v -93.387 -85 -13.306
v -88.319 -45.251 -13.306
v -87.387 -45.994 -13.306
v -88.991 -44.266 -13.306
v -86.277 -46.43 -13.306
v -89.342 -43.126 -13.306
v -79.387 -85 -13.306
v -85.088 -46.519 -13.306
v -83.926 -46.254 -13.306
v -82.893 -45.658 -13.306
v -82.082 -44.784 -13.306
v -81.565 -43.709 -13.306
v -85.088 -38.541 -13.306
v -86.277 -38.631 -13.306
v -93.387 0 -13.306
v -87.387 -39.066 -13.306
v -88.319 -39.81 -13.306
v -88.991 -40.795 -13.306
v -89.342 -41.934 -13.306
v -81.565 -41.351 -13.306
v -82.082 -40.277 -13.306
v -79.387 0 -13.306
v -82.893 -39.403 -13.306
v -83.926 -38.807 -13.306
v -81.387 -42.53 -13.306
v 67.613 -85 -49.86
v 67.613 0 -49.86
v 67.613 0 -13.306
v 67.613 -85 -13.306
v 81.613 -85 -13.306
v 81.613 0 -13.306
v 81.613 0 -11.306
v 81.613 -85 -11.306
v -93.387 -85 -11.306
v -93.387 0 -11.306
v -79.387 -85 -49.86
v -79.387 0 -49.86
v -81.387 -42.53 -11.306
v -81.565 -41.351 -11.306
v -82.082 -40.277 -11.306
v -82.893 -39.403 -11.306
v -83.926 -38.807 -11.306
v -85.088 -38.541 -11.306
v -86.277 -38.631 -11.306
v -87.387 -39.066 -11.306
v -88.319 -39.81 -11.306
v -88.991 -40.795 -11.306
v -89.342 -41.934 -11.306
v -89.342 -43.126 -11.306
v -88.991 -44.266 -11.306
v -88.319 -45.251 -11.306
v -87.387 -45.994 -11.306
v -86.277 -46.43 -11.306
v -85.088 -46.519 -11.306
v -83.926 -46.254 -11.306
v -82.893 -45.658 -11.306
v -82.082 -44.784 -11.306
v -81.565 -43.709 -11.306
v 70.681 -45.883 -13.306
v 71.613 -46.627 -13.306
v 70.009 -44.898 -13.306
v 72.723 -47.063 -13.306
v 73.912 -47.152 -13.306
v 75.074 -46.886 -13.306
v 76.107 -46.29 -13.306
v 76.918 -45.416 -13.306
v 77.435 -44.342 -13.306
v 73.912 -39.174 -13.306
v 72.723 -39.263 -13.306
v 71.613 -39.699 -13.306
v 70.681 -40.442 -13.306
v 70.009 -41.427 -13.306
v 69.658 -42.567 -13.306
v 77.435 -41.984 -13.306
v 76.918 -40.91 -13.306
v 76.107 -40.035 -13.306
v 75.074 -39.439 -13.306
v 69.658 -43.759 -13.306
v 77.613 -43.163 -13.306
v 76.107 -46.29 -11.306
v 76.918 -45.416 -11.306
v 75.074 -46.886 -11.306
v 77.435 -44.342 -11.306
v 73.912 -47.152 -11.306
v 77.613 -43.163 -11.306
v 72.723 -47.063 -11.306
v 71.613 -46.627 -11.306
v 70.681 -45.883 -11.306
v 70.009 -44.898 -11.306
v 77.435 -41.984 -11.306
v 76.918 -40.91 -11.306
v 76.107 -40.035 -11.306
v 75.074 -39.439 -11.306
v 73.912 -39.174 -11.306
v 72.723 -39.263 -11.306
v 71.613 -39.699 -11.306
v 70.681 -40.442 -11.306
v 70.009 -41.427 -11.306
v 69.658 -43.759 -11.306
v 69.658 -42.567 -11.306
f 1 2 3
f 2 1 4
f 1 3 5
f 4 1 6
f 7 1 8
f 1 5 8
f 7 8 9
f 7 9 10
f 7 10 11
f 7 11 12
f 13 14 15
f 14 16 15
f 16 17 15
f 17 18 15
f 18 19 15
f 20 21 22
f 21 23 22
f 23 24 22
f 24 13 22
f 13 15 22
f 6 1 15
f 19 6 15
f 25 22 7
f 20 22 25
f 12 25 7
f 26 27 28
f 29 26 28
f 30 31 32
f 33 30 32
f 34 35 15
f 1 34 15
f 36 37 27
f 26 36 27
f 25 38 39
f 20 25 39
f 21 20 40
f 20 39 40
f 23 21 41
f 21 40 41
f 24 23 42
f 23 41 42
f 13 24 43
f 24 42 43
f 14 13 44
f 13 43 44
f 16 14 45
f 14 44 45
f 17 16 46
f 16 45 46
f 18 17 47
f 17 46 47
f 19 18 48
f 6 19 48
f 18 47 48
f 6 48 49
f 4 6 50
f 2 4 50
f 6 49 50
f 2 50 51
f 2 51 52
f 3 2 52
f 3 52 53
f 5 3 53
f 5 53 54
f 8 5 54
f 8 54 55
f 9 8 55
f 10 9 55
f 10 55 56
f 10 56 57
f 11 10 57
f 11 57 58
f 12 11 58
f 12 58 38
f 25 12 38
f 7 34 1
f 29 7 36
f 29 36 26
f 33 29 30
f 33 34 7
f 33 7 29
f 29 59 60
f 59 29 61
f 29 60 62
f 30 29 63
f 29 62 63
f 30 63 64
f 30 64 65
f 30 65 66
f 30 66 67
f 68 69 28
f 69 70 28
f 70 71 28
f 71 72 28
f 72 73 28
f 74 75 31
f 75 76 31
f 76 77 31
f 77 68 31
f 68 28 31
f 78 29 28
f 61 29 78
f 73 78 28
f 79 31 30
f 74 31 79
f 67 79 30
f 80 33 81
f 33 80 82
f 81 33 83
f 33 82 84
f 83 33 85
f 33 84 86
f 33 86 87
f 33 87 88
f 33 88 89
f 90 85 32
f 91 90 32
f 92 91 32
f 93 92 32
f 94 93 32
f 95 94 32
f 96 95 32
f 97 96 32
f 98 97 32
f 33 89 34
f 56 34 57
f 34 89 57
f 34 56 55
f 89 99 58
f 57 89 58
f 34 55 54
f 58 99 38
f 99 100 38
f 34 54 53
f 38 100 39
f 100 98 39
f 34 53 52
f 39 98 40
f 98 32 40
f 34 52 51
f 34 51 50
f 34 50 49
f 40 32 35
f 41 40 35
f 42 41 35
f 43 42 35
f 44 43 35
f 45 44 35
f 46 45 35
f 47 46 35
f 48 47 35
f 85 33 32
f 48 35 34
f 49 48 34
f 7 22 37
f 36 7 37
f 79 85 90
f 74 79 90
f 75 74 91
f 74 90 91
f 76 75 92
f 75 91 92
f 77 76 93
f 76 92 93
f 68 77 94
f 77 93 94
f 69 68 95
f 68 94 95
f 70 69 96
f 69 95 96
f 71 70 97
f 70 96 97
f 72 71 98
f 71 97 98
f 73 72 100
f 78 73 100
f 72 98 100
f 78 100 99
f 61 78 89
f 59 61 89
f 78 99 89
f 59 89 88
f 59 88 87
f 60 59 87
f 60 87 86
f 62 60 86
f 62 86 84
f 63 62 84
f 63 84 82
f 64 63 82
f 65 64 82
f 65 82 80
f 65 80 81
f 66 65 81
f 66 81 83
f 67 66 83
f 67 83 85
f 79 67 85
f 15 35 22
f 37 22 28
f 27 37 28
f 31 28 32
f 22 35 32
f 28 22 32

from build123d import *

# Parameters (mm, degrees)
F1_DEPTH = 85
F2_R     = 4
F3_DEPTH = 25


with BuildPart() as f1:
    # F0 (on Front) → F1 (new body)
    with BuildSketch(Plane.XZ):
        Polygon((67.613126, -11.305504), (-79.386874, -11.305504), (-93.386874, -11.305504), (-93.386874, -13.305504), (-79.386874, -13.305504), (-79.386874, -49.860391), (67.613126, -49.860391), (67.613126, -13.305504), (81.613126, -13.305504), (81.613126, -11.305504), align=None)
    extrude(amount=F1_DEPTH)

    # F2 (on face) → F3 (cut)
    with BuildSketch(Plane.XY.offset(-11.305504)):
        with Locations((-85.386874, -42.530299)):
            Circle(F2_R)
        with Locations((73.613126, -43.162795)):
            Circle(F2_R)
    extrude(amount=-F3_DEPTH, mode=Mode.SUBTRACT)


solid = f1.part
